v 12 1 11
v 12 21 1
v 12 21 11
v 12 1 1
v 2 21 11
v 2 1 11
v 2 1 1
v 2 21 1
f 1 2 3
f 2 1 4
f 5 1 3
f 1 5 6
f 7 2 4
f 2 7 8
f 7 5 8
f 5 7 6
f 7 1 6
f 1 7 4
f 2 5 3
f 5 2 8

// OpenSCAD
$fa=3.000000;
$fs=0.500000;
union(){translate([1,0,0])translate([1,1,1])cube([10,10,10]);translate([0,10,0])translate([1,0,0])translate([1,1,1])cube([10,10,10]);}
